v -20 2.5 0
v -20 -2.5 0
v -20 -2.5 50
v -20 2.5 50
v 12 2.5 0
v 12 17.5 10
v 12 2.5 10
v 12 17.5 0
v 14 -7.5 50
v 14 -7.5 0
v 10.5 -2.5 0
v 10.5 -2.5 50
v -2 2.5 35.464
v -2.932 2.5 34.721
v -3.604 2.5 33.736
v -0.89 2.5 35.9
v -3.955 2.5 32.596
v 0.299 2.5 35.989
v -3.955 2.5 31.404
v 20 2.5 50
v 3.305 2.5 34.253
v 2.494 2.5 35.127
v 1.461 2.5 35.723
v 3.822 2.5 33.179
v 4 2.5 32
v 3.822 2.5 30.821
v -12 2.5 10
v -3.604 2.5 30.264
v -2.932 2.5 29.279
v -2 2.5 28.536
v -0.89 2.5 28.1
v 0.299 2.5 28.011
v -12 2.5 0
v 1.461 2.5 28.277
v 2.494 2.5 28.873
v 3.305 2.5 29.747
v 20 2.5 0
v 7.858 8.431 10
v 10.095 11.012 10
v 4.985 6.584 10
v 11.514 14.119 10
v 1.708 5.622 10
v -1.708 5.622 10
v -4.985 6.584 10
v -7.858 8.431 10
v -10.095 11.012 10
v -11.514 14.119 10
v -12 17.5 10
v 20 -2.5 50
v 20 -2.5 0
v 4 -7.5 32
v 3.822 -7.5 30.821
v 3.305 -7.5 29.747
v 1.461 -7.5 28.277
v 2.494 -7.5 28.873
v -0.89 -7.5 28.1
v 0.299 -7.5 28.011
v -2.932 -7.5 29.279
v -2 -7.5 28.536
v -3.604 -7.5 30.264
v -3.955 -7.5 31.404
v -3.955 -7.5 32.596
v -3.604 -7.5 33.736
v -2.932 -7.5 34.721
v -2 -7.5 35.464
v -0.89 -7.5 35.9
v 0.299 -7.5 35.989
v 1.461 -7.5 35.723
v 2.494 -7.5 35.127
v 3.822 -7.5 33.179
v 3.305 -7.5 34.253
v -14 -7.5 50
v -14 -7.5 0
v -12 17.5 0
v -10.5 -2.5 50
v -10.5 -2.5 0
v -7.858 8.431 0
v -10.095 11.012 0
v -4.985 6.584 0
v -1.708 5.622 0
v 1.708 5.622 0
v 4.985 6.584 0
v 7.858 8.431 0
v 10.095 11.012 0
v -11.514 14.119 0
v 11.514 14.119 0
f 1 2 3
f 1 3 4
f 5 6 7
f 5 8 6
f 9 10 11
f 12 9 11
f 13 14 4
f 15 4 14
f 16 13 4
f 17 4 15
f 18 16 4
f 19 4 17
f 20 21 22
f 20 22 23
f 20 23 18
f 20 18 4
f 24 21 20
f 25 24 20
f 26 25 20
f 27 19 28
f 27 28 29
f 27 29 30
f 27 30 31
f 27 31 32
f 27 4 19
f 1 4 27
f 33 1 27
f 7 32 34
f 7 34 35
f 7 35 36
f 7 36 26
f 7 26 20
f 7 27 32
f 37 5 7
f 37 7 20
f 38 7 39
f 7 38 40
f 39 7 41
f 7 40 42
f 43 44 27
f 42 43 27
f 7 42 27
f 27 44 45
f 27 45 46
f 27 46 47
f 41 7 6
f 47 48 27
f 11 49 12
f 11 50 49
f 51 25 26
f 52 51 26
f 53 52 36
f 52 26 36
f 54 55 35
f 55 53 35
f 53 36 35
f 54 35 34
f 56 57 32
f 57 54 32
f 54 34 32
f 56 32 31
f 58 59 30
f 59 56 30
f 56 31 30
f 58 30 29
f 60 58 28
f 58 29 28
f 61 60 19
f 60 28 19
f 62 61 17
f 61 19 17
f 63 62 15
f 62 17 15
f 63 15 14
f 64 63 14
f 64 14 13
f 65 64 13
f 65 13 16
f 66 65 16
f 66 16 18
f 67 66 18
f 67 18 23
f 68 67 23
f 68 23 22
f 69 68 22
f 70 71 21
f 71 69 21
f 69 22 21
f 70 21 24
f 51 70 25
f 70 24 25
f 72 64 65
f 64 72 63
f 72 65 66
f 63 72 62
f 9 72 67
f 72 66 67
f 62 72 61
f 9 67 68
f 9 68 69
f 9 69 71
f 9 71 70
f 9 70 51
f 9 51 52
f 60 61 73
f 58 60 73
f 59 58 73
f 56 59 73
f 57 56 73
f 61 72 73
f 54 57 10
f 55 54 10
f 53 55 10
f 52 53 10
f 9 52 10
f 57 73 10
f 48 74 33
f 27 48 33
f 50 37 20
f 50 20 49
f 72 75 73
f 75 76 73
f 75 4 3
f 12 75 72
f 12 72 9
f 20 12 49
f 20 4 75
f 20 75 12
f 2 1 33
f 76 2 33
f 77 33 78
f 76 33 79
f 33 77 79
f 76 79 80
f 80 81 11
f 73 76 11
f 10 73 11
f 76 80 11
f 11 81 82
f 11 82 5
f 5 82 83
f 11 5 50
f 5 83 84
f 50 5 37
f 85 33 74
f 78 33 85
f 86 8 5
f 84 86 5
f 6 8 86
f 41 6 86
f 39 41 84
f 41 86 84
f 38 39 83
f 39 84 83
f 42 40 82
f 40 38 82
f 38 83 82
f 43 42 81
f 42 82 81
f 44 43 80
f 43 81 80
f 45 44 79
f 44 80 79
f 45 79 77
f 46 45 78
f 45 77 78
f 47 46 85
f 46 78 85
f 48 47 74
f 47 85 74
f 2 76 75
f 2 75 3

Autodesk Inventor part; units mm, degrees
ref_plane "YZ Plane" through (0, 0, 0) normal (1, 0, 0) x (0, 1, 0)
ref_plane "XZ Plane" through (0, 0, 0) normal (0, 1, 0) x (-1, 0, 0)
ref_plane "XY Plane" through (0, 0, 0) normal (0, 0, 1) x (1, 0, 0)
sketch "草图1" plane through (0, 0, 0) normal (0, 0, 1) x (1, 0, 0)
  line L0 (0, 0) -> (0, 17.5565)
  line L1 (-20, 2.5) -> (20, 2.5)
  line L2 (20, 2.5) -> (20, -2.5)
  line L3 (-20, -2.5) -> (-20, 2.5)
  line L4 (-20, 2.5) -> (20, -2.5) construction
  line L5 (20, 2.5) -> (-20, -2.5) construction
  line L6 (0, -7.5) -> (14, -7.5)
  line L7 (0, -7.5) -> (-14, -7.5)
  line L8 (-10.5, -2.5) -> (-14, -7.5)
  line L9 (14, -7.5) -> (10.5, -2.5)
  line L10 (20, -2.5) -> (10.5, -2.5)
  line L11 (-10.5, -2.5) -> (-20, -2.5)
  dimension "d1" = 40
  dimension "d2" = 5
  dimension "d5" = 14
  dimension "d8" = 21
extrude "拉伸1" add sketch "草图1" along normal blind 50
sketch "草图2" plane through (0, 0, 0) normal (0, 0, -1) x (-1, 0, 0)
  line L0 (-20, 2.5) -> (20, 2.5) projected
  line L1 (0, 2.5) -> (0, 17.5)
  arc A0 (-12, 17.5) -> (12, 17.5) centre (0, 17.5) ccw
  line L2 (-12, 17.5) -> (-12, 2.5)
  line L3 (12, 17.5) -> (12, 2.5)
  point P0 (0, 0)
  dimension "d11" = 15
  dimension "d12" = 24
extrude "拉伸2" add sketch "草图2" against normal blind 10
sketch "草图3" plane through (-20, 2.5, 50) normal (0, 1, 0) x (1, 0, 0)
  line L0 (40, 0) -> (0, 0) projected
  line L1 (20, 0) -> (20, 18)
  circle A0 centre (20, 18) radius 4
  point P0 (20, 50)
  dimension "d15" = 18
  dimension "d16" = 8
extrude "拉伸3" cut sketch "草图3" against normal blind 20
properties part number "2-6"
